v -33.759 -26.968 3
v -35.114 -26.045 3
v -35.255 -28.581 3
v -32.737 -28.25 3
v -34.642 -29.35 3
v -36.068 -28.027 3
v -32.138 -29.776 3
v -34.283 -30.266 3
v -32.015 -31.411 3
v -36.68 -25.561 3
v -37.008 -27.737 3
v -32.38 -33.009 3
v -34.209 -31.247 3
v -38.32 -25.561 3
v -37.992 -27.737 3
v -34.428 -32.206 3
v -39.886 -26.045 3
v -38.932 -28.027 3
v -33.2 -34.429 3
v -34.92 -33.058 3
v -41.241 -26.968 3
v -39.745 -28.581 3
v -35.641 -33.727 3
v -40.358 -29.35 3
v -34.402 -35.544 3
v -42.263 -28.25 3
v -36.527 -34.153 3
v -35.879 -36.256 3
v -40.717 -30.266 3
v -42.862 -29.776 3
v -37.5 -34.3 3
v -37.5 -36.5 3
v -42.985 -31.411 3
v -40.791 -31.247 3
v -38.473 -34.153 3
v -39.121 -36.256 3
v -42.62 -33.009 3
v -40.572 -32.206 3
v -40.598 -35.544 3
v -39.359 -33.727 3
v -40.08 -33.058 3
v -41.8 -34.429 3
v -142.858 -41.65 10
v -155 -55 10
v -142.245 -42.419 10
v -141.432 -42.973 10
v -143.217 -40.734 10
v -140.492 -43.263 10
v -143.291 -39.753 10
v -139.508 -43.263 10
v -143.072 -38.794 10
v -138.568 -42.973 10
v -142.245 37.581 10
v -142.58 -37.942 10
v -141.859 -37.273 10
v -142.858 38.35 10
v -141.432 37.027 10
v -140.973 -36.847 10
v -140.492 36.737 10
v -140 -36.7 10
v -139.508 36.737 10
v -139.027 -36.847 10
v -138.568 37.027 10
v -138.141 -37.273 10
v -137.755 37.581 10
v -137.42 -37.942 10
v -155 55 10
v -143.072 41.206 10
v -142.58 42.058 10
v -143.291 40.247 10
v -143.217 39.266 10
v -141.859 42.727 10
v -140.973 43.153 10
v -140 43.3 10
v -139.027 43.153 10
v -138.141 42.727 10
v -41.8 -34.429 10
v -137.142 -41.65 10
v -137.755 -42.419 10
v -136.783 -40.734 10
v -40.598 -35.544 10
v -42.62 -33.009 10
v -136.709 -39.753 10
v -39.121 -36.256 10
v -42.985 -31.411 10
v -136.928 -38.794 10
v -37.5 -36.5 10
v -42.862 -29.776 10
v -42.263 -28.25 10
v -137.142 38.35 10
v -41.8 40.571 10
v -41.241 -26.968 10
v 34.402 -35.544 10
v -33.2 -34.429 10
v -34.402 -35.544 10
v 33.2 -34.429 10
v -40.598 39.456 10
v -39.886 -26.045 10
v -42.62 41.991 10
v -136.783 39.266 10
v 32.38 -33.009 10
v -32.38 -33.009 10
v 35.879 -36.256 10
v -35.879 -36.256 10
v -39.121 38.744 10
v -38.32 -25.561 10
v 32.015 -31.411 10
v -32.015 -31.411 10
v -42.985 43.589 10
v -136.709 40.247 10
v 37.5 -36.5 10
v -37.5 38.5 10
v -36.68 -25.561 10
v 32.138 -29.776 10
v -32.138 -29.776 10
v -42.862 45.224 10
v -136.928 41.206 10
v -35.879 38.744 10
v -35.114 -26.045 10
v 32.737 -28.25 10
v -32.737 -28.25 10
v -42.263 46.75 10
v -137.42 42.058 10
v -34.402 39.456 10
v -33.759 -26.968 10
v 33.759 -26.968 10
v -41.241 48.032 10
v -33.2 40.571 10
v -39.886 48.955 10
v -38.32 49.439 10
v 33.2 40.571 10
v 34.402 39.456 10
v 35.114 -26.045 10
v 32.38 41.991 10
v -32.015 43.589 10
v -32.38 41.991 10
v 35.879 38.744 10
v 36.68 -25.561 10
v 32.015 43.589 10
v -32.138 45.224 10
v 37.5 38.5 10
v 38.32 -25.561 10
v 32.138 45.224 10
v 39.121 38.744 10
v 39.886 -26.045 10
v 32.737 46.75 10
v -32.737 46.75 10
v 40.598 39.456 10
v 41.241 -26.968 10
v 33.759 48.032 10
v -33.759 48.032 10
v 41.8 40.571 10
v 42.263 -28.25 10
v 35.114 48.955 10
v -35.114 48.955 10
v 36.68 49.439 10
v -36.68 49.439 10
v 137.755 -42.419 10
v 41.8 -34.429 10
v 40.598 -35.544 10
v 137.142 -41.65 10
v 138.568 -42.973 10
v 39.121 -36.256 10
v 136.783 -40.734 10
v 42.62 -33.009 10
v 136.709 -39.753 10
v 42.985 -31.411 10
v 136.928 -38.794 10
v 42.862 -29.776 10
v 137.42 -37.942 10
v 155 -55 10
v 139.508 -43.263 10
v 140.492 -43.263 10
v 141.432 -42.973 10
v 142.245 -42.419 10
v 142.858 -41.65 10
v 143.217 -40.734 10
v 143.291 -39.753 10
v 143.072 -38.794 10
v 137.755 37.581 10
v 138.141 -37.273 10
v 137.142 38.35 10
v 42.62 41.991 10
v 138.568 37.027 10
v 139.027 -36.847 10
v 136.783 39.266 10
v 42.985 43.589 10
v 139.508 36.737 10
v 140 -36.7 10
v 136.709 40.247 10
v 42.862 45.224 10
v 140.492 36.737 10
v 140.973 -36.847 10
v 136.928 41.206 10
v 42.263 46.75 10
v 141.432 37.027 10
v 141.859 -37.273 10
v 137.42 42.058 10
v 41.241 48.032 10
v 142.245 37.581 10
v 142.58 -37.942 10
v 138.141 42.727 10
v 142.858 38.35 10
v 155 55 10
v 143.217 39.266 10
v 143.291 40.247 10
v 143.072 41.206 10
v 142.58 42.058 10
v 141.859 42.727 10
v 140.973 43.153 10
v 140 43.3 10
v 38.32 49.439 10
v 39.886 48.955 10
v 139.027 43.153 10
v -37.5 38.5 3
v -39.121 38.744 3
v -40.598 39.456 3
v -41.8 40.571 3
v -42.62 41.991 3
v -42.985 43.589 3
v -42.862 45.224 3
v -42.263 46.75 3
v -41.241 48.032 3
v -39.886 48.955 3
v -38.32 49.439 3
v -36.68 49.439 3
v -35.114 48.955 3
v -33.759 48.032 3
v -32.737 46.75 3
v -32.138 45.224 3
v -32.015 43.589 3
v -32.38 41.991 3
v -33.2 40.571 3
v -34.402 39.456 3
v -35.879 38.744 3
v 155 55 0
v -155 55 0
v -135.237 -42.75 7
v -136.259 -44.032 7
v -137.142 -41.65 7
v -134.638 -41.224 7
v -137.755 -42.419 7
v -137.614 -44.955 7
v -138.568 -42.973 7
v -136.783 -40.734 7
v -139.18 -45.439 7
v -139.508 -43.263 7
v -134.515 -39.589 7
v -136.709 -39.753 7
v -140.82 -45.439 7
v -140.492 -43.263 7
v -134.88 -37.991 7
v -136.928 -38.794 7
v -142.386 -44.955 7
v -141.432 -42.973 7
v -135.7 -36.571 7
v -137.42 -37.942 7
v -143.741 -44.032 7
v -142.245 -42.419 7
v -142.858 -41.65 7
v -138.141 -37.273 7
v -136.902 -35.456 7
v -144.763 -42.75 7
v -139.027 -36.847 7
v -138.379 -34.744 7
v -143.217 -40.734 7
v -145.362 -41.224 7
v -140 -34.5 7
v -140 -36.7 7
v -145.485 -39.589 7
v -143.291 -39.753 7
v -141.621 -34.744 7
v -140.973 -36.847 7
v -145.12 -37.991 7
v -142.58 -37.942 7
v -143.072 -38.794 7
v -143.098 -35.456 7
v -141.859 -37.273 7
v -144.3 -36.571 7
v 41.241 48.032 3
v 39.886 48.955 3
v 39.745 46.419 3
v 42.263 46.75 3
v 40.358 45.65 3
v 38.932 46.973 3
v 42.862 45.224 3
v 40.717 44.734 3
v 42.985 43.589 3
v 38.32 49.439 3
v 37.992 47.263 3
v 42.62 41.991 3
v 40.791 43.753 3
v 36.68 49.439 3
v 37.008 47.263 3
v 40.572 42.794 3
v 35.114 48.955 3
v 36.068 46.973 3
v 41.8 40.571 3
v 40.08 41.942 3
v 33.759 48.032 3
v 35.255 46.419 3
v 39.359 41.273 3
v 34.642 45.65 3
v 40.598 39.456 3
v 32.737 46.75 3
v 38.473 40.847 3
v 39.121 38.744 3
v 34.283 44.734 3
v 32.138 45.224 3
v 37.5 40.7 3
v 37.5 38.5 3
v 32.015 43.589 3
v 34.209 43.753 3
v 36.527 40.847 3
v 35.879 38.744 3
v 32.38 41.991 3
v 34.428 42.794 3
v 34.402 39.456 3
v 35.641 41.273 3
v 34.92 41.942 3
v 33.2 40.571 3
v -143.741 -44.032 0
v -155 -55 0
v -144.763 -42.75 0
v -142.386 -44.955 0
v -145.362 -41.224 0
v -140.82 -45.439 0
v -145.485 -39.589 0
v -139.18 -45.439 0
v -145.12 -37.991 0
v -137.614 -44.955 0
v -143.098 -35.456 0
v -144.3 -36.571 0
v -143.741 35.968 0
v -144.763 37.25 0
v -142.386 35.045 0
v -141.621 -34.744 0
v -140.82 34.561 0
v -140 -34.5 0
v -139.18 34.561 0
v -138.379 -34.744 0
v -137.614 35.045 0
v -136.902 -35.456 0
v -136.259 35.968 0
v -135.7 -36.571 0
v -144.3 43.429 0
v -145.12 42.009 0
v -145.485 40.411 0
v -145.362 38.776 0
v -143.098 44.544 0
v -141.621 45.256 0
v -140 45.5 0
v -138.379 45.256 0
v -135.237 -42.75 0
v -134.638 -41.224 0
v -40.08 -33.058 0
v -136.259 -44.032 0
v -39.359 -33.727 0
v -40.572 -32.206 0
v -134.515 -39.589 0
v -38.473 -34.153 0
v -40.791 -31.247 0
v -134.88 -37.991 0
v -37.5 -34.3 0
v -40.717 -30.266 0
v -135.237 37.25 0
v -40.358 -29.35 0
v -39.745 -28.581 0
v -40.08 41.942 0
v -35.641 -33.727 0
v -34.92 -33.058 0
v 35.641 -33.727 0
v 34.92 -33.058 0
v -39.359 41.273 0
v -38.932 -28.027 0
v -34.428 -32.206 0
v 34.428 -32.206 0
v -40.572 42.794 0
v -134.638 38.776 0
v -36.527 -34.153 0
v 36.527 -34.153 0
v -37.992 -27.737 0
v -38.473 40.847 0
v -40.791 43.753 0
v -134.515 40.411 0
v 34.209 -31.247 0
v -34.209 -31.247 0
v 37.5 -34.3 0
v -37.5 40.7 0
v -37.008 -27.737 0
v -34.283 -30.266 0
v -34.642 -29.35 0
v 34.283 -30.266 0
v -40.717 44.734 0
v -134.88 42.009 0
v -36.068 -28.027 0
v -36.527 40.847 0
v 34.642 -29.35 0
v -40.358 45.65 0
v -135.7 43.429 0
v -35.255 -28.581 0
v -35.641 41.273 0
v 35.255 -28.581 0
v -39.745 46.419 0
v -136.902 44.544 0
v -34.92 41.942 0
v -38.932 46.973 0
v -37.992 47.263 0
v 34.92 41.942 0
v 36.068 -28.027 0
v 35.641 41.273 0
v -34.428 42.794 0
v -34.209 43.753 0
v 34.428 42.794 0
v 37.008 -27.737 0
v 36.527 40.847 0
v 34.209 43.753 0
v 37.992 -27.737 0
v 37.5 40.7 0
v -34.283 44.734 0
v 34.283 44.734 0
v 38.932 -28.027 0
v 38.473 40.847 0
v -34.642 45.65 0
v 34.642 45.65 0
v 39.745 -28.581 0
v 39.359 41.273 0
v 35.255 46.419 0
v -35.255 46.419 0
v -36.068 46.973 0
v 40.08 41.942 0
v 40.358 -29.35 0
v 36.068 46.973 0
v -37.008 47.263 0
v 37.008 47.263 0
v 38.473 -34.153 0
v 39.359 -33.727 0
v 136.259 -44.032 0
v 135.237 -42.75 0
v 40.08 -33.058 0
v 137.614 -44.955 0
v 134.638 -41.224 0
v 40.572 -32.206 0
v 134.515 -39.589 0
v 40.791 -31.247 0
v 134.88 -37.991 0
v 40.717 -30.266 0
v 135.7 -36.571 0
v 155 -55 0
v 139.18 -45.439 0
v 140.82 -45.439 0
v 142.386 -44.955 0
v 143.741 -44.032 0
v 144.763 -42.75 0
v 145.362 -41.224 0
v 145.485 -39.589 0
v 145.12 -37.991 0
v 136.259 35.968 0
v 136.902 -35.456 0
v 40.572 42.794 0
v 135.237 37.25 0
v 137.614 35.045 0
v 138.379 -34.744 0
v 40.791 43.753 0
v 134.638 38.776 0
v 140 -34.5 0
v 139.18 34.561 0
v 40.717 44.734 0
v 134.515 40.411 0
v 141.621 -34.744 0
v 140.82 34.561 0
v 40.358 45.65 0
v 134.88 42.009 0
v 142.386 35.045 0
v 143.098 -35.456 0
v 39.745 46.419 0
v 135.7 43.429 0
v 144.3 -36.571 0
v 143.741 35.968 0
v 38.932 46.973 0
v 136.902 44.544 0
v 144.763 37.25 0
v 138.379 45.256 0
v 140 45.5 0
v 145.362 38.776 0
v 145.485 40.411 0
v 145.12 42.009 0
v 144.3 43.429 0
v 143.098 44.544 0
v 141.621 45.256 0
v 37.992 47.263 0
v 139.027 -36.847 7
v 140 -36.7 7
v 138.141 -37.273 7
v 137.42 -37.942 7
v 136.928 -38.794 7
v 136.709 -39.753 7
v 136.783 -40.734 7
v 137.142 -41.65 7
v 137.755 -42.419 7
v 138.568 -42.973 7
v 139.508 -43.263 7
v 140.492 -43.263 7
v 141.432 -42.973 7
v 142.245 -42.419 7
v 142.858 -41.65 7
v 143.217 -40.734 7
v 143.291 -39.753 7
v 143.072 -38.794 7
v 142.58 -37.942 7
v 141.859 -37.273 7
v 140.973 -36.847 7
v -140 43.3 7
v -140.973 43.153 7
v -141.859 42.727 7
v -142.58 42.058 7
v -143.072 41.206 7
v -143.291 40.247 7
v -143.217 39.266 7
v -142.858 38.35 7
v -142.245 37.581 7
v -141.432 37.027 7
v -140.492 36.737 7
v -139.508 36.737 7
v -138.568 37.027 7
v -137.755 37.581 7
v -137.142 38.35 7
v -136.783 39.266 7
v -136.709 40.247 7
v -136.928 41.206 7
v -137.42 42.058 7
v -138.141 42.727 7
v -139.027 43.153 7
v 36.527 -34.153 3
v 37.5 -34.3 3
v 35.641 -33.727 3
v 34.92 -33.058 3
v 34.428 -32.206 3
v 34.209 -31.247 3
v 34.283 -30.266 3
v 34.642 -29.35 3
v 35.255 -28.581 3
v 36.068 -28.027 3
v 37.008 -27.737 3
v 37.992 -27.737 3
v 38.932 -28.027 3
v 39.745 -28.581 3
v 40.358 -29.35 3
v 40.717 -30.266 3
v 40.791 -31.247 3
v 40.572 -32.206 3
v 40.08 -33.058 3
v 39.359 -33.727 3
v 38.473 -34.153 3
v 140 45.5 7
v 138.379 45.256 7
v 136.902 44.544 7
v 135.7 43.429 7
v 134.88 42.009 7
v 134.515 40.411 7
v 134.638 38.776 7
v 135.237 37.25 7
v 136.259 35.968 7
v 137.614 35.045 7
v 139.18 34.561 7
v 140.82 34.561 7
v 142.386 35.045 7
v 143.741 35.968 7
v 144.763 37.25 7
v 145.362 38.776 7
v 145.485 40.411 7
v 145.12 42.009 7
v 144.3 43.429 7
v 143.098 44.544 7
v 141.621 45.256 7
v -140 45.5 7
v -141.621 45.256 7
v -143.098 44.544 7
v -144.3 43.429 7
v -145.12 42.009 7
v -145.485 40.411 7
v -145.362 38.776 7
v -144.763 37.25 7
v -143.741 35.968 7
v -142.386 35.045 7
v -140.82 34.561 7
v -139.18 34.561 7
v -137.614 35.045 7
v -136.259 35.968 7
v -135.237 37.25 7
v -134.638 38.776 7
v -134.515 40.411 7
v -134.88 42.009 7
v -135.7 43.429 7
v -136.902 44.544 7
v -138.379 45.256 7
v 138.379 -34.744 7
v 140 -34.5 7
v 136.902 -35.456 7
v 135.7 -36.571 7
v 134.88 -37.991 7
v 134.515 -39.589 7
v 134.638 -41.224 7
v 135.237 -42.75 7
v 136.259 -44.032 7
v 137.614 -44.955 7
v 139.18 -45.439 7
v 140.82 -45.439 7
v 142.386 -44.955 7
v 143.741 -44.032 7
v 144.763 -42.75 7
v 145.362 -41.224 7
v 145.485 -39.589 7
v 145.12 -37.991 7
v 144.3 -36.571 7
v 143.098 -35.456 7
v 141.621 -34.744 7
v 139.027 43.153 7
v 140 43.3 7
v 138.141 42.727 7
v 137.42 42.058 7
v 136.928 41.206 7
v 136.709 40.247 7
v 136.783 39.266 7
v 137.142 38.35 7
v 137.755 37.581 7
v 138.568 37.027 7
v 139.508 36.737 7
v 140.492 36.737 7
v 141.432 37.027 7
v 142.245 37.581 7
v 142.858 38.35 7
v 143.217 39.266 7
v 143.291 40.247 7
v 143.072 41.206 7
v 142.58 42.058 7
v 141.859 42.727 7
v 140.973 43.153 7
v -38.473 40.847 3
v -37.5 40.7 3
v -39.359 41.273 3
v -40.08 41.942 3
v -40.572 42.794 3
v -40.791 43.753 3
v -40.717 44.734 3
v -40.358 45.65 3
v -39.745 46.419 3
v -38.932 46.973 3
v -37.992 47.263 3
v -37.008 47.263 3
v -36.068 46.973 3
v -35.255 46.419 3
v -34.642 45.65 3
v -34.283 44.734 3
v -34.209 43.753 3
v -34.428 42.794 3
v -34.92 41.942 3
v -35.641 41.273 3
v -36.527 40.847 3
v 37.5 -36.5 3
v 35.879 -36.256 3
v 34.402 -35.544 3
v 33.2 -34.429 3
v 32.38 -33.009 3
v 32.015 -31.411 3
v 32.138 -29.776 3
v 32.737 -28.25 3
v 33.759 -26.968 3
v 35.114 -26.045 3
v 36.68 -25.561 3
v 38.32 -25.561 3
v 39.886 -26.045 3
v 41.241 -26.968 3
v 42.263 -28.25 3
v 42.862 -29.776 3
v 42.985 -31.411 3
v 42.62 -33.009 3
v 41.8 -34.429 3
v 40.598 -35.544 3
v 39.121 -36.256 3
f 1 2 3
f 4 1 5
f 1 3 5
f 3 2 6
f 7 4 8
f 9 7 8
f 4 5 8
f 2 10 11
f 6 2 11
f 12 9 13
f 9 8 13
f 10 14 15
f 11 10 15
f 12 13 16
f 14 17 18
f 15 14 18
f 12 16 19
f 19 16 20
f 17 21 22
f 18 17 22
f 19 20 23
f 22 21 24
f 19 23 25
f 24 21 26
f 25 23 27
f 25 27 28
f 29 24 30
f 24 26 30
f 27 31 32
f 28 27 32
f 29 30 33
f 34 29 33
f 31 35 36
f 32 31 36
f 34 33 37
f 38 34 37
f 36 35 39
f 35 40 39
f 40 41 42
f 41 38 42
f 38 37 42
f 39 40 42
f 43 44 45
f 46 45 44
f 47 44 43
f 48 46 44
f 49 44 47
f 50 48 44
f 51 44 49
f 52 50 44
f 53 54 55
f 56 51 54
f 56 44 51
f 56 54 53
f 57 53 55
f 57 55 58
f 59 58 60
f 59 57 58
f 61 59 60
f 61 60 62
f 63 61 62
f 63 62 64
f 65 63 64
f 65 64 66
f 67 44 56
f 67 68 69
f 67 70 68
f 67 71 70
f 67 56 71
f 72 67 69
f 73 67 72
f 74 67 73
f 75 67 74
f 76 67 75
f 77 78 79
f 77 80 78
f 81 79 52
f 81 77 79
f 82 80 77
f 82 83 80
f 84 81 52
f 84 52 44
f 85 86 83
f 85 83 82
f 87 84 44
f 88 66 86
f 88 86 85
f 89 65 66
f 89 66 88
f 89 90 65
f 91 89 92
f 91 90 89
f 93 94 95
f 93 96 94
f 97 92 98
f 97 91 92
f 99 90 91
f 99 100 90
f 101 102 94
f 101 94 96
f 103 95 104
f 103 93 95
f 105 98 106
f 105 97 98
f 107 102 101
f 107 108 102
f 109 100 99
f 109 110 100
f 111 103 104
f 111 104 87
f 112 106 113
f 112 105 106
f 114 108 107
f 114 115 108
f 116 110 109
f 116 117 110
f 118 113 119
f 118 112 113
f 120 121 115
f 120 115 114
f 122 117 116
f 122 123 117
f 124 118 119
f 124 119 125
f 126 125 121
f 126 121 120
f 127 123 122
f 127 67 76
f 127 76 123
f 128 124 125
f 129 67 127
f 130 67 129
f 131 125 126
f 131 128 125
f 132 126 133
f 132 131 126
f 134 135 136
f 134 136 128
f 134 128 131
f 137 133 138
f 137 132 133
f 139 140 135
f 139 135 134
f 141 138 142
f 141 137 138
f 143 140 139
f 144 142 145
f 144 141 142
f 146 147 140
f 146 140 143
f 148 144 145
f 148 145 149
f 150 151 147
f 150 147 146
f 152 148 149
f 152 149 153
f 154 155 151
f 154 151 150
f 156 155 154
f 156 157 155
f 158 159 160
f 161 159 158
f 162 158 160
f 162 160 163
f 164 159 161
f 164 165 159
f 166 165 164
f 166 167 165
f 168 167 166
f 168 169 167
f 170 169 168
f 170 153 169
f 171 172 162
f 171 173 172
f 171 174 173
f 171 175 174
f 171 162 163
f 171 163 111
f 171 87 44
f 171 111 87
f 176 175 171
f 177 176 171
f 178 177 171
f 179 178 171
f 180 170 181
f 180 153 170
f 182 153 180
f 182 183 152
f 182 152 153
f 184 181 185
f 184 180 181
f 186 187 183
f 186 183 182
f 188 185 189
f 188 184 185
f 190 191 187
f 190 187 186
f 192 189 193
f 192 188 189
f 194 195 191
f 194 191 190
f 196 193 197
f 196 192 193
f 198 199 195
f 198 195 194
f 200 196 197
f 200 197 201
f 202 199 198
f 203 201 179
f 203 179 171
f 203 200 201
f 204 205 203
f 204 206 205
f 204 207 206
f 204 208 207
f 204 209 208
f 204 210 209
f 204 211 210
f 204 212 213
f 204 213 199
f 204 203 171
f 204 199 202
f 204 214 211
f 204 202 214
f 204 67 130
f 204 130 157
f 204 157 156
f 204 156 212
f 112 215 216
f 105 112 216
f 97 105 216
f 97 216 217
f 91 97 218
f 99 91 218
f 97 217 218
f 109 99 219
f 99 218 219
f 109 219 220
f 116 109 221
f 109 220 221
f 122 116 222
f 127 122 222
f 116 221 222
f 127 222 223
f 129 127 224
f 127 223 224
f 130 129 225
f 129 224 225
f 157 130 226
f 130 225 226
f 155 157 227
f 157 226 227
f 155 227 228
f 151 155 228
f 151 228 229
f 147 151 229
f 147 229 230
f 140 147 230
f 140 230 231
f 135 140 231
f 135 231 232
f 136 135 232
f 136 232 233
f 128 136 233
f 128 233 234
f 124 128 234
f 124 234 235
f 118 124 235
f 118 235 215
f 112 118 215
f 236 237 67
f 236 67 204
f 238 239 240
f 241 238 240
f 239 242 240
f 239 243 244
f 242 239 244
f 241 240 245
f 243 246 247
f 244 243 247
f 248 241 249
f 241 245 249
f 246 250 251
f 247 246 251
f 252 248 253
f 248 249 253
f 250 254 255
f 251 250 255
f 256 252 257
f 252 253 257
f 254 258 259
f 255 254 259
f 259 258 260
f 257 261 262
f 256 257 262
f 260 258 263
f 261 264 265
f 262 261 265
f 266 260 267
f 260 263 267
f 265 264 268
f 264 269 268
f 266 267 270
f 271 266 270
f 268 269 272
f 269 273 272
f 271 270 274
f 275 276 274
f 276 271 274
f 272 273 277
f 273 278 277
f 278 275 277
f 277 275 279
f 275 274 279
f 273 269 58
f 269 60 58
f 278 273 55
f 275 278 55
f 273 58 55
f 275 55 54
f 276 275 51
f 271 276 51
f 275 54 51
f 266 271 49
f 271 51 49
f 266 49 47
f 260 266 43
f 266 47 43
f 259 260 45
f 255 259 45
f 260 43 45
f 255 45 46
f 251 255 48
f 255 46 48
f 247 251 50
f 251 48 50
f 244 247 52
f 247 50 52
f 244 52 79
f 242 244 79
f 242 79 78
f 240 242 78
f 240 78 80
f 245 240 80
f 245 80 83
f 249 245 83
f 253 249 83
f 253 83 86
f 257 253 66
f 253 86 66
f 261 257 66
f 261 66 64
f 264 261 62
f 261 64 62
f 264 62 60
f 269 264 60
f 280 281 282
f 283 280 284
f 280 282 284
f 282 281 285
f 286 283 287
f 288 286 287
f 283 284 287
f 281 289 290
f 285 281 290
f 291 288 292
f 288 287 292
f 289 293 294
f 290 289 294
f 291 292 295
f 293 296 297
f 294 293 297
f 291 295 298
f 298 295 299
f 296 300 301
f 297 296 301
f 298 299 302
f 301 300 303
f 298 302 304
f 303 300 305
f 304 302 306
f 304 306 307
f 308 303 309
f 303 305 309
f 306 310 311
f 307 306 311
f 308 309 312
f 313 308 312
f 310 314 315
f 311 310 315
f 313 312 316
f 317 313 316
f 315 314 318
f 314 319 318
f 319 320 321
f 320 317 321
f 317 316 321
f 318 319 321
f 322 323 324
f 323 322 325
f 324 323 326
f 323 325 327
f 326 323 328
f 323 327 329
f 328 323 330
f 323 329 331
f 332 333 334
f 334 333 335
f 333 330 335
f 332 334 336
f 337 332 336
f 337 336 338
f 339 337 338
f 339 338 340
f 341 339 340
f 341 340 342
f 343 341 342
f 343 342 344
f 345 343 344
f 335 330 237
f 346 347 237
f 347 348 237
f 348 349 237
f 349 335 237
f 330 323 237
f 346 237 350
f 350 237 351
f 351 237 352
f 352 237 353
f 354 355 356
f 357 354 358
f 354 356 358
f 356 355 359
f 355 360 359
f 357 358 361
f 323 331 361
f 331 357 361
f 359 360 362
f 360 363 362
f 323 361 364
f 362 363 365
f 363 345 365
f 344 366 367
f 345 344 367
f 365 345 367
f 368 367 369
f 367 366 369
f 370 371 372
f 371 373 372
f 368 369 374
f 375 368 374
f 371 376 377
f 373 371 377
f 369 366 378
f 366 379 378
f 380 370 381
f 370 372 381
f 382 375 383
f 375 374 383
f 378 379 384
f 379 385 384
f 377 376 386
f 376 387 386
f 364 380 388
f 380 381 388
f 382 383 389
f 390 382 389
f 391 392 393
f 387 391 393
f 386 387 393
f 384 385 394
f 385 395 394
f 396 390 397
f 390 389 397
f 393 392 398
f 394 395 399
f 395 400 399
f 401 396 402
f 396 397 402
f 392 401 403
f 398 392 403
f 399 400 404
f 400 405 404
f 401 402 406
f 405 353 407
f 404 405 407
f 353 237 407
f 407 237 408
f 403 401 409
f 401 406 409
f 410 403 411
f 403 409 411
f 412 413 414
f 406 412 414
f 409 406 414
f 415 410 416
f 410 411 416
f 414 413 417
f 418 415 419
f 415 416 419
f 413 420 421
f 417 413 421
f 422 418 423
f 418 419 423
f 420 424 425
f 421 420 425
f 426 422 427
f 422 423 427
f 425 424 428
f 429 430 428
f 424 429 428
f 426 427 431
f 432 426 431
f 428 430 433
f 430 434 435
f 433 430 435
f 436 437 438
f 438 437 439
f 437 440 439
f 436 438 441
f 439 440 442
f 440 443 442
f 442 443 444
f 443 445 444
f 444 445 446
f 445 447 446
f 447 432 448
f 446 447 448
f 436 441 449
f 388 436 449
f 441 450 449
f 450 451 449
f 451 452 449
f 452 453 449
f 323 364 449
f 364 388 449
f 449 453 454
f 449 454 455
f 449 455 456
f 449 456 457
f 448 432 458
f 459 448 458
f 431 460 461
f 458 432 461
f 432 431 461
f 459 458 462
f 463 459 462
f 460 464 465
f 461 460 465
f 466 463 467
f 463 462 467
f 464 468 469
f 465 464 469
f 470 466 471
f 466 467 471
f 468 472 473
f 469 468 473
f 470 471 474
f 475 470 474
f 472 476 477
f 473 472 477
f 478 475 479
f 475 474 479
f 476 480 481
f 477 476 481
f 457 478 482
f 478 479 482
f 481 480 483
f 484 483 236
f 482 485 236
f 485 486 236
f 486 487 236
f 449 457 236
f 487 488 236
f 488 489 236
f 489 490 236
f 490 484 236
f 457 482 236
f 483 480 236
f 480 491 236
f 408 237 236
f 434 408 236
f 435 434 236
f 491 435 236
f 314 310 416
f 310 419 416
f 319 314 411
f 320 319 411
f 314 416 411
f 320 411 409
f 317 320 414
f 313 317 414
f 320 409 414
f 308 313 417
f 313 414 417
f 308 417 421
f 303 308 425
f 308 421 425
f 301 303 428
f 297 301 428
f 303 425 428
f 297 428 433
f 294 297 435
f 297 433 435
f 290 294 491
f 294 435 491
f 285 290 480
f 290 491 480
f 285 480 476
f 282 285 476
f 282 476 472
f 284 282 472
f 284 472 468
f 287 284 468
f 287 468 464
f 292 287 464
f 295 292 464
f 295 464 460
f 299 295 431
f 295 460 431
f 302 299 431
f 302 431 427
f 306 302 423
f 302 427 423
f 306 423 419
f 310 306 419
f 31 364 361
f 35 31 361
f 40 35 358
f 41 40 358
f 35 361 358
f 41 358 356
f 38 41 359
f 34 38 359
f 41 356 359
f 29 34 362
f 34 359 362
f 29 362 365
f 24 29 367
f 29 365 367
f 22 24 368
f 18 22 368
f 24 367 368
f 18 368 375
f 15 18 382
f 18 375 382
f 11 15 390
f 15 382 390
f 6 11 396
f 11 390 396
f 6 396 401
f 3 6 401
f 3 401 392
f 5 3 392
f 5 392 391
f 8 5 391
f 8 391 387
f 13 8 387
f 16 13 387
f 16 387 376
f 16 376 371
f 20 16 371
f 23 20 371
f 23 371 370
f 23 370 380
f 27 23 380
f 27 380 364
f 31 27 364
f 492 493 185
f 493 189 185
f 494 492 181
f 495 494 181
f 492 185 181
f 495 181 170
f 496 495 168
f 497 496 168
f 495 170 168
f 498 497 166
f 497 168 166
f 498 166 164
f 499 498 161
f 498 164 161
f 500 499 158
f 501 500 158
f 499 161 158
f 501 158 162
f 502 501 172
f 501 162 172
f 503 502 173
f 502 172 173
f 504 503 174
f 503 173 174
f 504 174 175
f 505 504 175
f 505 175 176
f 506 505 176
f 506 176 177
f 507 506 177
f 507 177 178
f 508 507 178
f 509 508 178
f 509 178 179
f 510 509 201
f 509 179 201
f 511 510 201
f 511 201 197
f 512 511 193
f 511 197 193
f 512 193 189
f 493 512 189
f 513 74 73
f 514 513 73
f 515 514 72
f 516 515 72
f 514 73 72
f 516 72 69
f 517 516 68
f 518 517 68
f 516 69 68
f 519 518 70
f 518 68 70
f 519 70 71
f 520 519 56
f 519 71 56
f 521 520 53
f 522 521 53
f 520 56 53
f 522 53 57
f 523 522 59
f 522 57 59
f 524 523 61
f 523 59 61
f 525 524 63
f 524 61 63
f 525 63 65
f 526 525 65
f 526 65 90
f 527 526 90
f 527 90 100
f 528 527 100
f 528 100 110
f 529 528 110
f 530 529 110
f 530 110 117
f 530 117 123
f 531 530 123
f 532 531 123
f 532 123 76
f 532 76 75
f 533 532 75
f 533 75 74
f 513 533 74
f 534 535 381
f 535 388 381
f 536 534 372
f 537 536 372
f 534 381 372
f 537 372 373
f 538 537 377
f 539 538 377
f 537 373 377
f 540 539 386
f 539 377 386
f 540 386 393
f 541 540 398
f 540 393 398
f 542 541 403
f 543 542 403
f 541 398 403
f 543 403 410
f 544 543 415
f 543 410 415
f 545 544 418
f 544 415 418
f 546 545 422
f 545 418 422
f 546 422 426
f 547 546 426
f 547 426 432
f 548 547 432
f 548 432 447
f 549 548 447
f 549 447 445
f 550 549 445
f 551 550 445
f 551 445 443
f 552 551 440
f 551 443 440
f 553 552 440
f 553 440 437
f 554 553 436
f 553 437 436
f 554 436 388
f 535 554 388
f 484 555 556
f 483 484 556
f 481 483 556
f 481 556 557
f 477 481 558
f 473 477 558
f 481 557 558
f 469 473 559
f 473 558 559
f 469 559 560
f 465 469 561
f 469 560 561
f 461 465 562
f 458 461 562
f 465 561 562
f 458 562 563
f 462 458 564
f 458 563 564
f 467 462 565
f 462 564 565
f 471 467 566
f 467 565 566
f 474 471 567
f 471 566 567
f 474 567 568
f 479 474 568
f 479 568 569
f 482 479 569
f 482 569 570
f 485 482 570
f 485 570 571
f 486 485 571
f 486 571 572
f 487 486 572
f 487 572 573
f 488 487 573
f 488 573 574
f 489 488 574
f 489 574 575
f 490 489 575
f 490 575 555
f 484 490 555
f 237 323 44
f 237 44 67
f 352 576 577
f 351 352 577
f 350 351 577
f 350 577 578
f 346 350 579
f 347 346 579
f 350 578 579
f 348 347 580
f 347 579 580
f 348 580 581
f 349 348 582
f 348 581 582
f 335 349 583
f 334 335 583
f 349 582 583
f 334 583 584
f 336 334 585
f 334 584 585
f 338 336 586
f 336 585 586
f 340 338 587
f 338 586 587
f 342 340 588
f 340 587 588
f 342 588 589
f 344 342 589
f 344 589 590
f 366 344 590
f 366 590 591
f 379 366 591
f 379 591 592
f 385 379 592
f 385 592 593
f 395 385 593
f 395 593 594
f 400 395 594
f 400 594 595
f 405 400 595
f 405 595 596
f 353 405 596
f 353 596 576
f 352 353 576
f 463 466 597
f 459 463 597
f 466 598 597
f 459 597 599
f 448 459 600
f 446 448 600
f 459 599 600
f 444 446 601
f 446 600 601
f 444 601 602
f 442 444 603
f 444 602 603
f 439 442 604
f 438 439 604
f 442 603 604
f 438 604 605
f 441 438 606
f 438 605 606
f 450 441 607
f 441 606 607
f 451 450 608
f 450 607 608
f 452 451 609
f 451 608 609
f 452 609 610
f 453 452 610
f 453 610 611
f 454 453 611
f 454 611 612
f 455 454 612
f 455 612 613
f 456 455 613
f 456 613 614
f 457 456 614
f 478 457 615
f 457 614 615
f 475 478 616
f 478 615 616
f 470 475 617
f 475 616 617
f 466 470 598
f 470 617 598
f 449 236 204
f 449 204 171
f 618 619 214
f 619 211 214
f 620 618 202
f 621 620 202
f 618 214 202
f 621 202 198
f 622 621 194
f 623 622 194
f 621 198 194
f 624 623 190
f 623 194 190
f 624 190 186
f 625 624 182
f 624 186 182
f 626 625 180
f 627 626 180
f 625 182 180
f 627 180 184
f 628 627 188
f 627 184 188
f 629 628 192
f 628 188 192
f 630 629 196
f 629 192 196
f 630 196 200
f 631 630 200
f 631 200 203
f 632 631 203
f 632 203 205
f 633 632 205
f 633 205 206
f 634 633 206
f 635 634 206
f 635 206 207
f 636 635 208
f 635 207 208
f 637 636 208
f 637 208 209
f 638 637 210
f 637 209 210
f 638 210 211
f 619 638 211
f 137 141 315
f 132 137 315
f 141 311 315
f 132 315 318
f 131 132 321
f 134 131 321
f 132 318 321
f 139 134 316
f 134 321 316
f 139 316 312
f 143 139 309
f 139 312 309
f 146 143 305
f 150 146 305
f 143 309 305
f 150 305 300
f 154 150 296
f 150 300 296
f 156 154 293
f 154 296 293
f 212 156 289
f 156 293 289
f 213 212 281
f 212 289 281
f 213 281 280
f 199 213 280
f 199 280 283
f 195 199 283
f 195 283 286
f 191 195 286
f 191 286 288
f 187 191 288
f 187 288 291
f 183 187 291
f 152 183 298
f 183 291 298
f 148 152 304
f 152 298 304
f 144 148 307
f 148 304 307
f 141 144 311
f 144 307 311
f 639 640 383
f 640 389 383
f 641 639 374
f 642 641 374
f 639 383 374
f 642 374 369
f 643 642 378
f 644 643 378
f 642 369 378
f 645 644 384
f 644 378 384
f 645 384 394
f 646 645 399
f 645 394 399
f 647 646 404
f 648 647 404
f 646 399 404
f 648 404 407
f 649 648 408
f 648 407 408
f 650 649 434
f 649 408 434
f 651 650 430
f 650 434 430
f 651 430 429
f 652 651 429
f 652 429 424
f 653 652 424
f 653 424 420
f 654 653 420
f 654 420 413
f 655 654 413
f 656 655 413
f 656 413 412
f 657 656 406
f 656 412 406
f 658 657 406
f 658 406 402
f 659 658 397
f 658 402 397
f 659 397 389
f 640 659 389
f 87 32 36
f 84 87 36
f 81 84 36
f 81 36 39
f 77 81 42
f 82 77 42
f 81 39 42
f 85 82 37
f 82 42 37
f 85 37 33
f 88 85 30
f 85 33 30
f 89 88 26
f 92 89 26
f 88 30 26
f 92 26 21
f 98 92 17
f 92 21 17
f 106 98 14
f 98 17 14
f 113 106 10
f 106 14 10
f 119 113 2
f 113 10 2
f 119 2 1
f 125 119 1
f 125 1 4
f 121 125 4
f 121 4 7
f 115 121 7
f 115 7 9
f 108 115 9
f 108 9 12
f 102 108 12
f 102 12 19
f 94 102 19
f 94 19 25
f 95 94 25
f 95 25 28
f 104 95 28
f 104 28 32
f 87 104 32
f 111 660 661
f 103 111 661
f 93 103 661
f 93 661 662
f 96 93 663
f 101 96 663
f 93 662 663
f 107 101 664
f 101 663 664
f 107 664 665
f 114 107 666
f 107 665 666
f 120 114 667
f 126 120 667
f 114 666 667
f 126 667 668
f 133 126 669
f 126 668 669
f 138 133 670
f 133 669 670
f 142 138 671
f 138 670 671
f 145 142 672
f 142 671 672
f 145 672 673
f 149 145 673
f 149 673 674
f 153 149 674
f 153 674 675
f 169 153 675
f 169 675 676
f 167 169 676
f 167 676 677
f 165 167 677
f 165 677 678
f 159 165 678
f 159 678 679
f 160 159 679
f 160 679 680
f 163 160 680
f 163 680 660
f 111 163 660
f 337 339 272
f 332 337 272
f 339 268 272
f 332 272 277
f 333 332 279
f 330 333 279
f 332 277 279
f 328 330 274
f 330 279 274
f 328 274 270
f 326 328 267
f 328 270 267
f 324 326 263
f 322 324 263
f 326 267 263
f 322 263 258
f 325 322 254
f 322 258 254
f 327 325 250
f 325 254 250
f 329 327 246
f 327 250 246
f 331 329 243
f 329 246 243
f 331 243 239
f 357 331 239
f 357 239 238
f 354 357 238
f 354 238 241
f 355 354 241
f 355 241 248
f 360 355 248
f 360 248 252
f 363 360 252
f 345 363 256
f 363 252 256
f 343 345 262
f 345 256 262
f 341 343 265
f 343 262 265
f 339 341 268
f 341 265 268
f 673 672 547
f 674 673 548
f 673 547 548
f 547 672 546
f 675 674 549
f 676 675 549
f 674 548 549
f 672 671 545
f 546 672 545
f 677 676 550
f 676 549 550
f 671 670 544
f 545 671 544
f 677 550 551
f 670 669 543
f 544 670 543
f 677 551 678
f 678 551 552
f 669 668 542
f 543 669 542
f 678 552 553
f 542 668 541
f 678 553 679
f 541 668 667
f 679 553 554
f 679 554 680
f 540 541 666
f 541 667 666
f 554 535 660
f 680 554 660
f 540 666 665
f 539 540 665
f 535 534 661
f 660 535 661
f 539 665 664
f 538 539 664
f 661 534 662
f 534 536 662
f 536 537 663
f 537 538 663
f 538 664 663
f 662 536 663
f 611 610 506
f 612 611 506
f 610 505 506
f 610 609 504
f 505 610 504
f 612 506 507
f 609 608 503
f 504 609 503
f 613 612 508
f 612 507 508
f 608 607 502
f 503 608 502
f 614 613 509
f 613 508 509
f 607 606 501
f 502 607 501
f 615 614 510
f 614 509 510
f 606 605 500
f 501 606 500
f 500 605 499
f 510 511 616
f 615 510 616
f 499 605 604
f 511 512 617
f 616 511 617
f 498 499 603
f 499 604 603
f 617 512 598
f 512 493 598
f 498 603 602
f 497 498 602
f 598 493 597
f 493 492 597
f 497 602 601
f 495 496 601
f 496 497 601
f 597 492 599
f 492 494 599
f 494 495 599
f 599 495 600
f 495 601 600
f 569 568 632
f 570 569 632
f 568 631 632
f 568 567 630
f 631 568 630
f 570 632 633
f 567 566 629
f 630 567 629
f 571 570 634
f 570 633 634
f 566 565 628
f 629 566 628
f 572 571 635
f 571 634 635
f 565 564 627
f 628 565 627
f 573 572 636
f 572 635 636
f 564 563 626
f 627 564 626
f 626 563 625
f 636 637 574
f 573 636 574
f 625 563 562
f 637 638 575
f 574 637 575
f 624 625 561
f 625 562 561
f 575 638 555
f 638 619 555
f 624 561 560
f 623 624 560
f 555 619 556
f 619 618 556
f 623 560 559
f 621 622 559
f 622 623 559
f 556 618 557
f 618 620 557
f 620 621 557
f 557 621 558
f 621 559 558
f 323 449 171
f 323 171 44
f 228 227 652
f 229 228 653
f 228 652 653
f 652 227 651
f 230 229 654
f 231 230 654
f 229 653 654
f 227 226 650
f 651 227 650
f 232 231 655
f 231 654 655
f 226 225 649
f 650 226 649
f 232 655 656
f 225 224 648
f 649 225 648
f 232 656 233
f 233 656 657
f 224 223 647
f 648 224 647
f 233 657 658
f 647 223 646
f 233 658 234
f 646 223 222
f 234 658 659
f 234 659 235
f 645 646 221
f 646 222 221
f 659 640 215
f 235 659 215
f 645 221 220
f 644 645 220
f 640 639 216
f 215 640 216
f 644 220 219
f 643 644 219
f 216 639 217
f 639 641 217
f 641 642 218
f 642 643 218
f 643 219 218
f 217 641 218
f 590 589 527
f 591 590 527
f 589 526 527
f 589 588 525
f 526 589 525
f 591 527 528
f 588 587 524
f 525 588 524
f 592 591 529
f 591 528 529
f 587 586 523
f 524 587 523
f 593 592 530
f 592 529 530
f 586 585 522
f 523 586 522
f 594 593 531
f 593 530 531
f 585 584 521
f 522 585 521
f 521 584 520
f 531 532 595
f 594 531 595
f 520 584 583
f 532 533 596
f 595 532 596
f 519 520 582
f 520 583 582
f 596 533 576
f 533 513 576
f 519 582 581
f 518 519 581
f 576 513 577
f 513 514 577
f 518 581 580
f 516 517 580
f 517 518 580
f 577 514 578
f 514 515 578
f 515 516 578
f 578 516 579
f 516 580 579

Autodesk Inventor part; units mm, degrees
ref_plane "YZ Plane" through (0, 0, 0) normal (1, 0, 0) x (0, 1, 0)
ref_plane "XZ Plane" through (0, 0, 0) normal (0, 1, 0) x (-1, 0, 0)
ref_plane "XY Plane" through (0, 0, 0) normal (0, 0, 1) x (1, 0, 0)
sketch "Sketch1" plane through (0, 0, 0) normal (0, 0, 1) x (1, 0, 0)
  line L0 (-155, 55) -> (155, 55)
  line L1 (155, 55) -> (155, -55)
  line L2 (155, -55) -> (-155, -55)
  line L3 (-155, -55) -> (-155, 55)
  point P0 (0, 0)
  dimension "d0" = 110
  dimension "d1" = 310
  dimension "d2" = 155
  dimension "d3" = 55
extrude "Extrusion1" add sketch "Sketch1" along normal blind 10
sketch "Sketch2" plane through (0, 0, 10) normal (0, 0, 1) x (1, 0, 0)
  line L0 (155, 55) -> (-155, 55) projected
  point P0 (0, 0)
  point P1 (-37.5, 44)
  point P2 (37.5, 44)
  point P3 (-37.5, -31)
  point P4 (37.5, -31)
  dimension "d6" = 75
  dimension "d7" = 11
  dimension "d8" = 75
  dimension "d27" = 37.5
hole "Hole1" at (-37.5, 44, 10) at (37.5, 44, 10) at (-37.5, -31, 10) at (37.5, -31, 10) direction (0, 0, -1) diameter 6.6 end through all counterbore diameter 11 counterbore depth 7 clearance for "Hex Head Cap Screw ISO 24017" size "M6" standard "ISO"
sketch "Sketch3" plane through (0, 0, 0) normal (0, 0, -1) x (-1, 0, 0)
  point P0 (0, 0)
  point P1 (-140, 40)
  point P2 (-140, -40)
  point P3 (140, 40)
  point P4 (140, -40)
  dimension "d16" = 80
  dimension "d17" = 40
  dimension "d18" = 280
  dimension "d19" = 140
hole "Hole2" at (140, 40, 0) at (140, -40, 0) at (-140, 40, 0) at (-140, -40, 0) direction (0, 0, 1) diameter 6.6 end through all counterbore diameter 11 counterbore depth 7 clearance for "Hex Head Cap Screw ISO 24017" size "M6" standard "ISO"
equation "\"d2\" = 0.5 * d1"
equation "\"d3\" = 0.5 * d0"
equation "\"d27\" = 0.5 * d6"
equation "\"d17\" = 0.5 * d16"
equation "\"d19\" = 0.5 * d18"
properties part number "zStagePostAttach"
